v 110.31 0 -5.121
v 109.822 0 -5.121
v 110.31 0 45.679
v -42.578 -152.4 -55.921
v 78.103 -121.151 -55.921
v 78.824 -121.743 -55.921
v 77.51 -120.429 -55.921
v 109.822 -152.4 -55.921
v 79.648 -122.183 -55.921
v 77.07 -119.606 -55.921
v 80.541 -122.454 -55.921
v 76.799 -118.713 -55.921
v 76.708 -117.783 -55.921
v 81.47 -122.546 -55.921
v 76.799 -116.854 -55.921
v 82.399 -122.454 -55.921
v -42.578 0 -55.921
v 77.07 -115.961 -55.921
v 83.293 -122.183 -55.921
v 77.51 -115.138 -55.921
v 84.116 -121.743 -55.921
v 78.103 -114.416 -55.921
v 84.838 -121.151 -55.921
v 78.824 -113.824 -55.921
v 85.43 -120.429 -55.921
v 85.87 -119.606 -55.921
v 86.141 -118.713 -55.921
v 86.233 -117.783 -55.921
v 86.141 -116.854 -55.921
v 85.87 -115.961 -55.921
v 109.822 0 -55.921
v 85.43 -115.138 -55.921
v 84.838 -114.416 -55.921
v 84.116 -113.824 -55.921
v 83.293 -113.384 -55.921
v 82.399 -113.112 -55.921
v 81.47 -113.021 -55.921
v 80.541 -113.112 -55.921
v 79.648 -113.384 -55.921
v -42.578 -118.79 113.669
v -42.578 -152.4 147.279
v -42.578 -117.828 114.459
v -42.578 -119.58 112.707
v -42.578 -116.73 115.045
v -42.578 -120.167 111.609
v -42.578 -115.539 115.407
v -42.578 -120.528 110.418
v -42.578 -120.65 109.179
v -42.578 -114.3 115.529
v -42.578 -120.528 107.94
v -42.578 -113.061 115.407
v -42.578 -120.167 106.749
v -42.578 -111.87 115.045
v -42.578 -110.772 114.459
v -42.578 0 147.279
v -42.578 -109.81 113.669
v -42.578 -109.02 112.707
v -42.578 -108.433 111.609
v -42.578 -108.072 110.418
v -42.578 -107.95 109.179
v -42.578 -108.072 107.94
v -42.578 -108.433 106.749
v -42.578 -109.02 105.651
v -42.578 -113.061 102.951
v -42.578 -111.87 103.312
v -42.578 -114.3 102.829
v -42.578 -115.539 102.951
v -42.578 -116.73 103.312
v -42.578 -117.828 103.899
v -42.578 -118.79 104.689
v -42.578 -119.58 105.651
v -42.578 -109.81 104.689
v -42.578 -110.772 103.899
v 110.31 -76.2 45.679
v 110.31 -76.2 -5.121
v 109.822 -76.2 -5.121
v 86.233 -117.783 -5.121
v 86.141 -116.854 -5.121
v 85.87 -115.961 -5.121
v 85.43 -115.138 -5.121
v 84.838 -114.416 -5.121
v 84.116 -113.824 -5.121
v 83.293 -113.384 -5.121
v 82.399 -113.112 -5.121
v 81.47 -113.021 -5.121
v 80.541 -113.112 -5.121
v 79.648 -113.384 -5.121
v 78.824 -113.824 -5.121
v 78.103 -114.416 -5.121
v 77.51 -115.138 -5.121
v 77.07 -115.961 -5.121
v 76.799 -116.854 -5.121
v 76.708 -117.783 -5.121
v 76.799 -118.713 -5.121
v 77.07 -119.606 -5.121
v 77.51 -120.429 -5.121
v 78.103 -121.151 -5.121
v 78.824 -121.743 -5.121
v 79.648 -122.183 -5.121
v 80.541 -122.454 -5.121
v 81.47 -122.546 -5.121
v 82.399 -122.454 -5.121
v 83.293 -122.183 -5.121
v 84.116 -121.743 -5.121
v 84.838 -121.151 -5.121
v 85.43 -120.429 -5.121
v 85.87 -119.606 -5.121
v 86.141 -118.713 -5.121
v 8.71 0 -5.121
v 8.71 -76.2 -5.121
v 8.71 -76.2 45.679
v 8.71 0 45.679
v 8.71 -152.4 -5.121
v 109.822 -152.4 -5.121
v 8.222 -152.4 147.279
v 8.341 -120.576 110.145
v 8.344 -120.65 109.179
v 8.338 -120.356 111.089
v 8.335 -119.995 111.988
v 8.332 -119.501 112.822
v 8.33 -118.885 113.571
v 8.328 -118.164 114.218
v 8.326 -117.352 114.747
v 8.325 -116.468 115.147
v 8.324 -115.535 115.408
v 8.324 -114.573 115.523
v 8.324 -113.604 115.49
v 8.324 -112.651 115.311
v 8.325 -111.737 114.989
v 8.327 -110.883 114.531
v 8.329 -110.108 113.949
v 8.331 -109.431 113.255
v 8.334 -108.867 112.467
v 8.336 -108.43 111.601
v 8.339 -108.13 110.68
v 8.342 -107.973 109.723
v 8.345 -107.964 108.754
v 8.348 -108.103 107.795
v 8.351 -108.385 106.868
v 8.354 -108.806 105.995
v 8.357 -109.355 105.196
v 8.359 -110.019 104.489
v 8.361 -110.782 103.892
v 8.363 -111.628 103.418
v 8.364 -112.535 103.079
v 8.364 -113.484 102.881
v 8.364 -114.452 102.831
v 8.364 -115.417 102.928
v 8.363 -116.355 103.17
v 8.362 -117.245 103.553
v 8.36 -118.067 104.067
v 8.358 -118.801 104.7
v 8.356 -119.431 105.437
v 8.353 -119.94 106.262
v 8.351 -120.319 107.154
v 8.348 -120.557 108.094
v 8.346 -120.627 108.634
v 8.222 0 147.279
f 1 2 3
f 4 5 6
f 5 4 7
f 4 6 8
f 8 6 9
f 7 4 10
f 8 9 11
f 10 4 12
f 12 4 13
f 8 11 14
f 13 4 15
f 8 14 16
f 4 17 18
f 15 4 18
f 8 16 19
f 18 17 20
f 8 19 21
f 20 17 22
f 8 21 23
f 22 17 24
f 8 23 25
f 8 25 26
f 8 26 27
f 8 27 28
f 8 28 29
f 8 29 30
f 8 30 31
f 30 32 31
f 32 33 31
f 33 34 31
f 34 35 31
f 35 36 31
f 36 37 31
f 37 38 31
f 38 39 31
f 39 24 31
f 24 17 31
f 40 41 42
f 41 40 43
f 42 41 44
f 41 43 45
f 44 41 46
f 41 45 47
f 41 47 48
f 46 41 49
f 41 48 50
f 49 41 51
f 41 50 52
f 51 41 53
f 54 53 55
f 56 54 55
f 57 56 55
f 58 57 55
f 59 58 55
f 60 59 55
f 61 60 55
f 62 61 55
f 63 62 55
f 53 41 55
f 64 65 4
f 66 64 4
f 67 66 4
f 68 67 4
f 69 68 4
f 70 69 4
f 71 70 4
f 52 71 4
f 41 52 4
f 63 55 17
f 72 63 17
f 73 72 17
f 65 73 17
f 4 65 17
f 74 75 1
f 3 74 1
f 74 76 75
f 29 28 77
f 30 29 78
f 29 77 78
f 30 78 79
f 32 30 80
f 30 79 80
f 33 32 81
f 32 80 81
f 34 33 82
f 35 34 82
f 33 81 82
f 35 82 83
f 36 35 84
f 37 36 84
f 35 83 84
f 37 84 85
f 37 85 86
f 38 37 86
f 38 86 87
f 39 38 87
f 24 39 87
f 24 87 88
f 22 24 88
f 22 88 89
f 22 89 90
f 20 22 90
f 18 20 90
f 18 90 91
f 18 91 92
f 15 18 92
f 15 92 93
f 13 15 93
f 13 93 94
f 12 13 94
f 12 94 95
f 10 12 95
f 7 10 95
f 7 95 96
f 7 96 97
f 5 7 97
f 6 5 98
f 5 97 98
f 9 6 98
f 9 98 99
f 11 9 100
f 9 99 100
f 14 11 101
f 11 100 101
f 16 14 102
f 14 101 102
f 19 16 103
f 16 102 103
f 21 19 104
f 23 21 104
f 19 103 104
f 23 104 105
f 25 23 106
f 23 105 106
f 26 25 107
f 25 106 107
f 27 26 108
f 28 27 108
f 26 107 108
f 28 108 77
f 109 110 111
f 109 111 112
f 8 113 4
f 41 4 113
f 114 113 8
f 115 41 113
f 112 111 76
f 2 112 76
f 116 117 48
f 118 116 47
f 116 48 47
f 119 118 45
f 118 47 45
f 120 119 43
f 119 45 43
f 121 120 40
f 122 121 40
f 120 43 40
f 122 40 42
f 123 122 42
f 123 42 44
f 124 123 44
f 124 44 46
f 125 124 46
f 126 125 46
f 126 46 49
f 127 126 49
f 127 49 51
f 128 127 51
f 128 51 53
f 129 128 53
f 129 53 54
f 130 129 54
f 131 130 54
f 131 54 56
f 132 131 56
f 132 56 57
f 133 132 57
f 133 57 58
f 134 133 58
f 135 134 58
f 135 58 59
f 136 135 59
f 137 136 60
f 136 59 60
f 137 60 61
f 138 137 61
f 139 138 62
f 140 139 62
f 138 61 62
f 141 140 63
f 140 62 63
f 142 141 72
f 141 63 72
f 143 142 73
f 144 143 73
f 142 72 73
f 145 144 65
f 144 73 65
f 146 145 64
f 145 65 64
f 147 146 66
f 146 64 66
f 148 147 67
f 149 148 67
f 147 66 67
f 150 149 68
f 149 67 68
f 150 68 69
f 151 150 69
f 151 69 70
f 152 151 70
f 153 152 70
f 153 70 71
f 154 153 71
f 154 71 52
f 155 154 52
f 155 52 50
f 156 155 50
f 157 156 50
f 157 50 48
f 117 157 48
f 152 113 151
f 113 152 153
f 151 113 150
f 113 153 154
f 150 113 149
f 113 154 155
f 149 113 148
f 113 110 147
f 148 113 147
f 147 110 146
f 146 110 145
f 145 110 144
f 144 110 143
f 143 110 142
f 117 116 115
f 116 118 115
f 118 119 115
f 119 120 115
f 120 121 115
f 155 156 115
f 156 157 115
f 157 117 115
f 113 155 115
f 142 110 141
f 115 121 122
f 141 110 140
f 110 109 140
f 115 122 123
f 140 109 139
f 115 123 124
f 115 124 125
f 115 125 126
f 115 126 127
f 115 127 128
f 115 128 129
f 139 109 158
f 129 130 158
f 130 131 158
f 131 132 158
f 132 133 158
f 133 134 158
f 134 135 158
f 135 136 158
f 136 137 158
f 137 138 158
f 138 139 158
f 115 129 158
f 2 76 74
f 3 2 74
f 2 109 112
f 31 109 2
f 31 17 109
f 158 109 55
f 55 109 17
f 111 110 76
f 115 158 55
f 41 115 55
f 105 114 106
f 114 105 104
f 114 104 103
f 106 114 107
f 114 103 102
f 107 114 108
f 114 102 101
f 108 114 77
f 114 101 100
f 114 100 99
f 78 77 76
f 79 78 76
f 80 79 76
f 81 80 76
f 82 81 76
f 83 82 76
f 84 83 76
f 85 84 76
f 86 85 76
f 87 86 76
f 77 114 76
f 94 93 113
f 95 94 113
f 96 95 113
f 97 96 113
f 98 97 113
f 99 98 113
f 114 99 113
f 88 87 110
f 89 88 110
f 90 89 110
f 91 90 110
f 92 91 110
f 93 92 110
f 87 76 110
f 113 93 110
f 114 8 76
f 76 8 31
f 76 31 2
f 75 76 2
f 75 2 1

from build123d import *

# Parameters (mm, degrees)
F1_DEPTH  = 152.4
F2_W      = 101.6
F2_H      = 76.2
F3_DEPTH  = 50.8
F5_DEPTH  = 76.2
F6_R      = 4.7625
F7_DEPTH  = 101.6
F9_D      = 12.7
F1_FACE_W = 101.111528
F1_FACE_H = 76.2
F1_FACE_R = 4.7625
F10_DEPTH = 101.6


with BuildPart() as f1:
    # F0 (on Front) → F1 (new body)
    with BuildSketch(Plane.XZ):
        Polygon((8.221924, 147.278765), (-42.578076, 147.278765), (-42.578076, -55.921235), (109.821924, -55.921235), (109.821924, -5.121235), (8.710396, -5.121235), align=None)
    extrude(amount=F1_DEPTH)

    # F2 (on face) → F3 (join)
    with BuildSketch(Plane.XY.offset(-5.121235)):
        with Locations((59.510396, -38.1)):
            Rectangle(F2_W, F2_H)
    extrude(amount=F3_DEPTH)

    # F4 (on face) → F5 (cut)
    with BuildSketch(Plane.XZ.offset(76.2)):
        Polygon((110.310396, 45.678765), (8.710396, 45.678765), (109.821924, -5.121235), align=None)
    extrude(amount=-F5_DEPTH, mode=Mode.SUBTRACT)

    # F6 (on face) → F7 (cut)
    with BuildSketch(Plane.XY.offset(-5.121235)):
        with Locations((81.470236, -117.783487)):
            Circle(F6_R)
    extrude(amount=-F7_DEPTH, mode=Mode.SUBTRACT)

    # F9 (through all)
    with Locations(Plane.YZ.offset(110.310396)):
        with Locations((-114.3, 109.178765)):
            Hole(F9_D / 2)

    # F1_face (on face) → F10 (cut)
    with BuildSketch(Plane(origin=(59.26616, -76.2, -5.121235), x_dir=(1, 0, 0), z_dir=(0, 0, 1))):
        with Locations((0, -38.1)):
            Rectangle(F1_FACE_W, F1_FACE_H)
        with Locations((22.204076, -41.583487)):
            Circle(F1_FACE_R, mode=Mode.SUBTRACT)
    extrude(amount=F10_DEPTH, mode=Mode.SUBTRACT)


solid = f1.part
